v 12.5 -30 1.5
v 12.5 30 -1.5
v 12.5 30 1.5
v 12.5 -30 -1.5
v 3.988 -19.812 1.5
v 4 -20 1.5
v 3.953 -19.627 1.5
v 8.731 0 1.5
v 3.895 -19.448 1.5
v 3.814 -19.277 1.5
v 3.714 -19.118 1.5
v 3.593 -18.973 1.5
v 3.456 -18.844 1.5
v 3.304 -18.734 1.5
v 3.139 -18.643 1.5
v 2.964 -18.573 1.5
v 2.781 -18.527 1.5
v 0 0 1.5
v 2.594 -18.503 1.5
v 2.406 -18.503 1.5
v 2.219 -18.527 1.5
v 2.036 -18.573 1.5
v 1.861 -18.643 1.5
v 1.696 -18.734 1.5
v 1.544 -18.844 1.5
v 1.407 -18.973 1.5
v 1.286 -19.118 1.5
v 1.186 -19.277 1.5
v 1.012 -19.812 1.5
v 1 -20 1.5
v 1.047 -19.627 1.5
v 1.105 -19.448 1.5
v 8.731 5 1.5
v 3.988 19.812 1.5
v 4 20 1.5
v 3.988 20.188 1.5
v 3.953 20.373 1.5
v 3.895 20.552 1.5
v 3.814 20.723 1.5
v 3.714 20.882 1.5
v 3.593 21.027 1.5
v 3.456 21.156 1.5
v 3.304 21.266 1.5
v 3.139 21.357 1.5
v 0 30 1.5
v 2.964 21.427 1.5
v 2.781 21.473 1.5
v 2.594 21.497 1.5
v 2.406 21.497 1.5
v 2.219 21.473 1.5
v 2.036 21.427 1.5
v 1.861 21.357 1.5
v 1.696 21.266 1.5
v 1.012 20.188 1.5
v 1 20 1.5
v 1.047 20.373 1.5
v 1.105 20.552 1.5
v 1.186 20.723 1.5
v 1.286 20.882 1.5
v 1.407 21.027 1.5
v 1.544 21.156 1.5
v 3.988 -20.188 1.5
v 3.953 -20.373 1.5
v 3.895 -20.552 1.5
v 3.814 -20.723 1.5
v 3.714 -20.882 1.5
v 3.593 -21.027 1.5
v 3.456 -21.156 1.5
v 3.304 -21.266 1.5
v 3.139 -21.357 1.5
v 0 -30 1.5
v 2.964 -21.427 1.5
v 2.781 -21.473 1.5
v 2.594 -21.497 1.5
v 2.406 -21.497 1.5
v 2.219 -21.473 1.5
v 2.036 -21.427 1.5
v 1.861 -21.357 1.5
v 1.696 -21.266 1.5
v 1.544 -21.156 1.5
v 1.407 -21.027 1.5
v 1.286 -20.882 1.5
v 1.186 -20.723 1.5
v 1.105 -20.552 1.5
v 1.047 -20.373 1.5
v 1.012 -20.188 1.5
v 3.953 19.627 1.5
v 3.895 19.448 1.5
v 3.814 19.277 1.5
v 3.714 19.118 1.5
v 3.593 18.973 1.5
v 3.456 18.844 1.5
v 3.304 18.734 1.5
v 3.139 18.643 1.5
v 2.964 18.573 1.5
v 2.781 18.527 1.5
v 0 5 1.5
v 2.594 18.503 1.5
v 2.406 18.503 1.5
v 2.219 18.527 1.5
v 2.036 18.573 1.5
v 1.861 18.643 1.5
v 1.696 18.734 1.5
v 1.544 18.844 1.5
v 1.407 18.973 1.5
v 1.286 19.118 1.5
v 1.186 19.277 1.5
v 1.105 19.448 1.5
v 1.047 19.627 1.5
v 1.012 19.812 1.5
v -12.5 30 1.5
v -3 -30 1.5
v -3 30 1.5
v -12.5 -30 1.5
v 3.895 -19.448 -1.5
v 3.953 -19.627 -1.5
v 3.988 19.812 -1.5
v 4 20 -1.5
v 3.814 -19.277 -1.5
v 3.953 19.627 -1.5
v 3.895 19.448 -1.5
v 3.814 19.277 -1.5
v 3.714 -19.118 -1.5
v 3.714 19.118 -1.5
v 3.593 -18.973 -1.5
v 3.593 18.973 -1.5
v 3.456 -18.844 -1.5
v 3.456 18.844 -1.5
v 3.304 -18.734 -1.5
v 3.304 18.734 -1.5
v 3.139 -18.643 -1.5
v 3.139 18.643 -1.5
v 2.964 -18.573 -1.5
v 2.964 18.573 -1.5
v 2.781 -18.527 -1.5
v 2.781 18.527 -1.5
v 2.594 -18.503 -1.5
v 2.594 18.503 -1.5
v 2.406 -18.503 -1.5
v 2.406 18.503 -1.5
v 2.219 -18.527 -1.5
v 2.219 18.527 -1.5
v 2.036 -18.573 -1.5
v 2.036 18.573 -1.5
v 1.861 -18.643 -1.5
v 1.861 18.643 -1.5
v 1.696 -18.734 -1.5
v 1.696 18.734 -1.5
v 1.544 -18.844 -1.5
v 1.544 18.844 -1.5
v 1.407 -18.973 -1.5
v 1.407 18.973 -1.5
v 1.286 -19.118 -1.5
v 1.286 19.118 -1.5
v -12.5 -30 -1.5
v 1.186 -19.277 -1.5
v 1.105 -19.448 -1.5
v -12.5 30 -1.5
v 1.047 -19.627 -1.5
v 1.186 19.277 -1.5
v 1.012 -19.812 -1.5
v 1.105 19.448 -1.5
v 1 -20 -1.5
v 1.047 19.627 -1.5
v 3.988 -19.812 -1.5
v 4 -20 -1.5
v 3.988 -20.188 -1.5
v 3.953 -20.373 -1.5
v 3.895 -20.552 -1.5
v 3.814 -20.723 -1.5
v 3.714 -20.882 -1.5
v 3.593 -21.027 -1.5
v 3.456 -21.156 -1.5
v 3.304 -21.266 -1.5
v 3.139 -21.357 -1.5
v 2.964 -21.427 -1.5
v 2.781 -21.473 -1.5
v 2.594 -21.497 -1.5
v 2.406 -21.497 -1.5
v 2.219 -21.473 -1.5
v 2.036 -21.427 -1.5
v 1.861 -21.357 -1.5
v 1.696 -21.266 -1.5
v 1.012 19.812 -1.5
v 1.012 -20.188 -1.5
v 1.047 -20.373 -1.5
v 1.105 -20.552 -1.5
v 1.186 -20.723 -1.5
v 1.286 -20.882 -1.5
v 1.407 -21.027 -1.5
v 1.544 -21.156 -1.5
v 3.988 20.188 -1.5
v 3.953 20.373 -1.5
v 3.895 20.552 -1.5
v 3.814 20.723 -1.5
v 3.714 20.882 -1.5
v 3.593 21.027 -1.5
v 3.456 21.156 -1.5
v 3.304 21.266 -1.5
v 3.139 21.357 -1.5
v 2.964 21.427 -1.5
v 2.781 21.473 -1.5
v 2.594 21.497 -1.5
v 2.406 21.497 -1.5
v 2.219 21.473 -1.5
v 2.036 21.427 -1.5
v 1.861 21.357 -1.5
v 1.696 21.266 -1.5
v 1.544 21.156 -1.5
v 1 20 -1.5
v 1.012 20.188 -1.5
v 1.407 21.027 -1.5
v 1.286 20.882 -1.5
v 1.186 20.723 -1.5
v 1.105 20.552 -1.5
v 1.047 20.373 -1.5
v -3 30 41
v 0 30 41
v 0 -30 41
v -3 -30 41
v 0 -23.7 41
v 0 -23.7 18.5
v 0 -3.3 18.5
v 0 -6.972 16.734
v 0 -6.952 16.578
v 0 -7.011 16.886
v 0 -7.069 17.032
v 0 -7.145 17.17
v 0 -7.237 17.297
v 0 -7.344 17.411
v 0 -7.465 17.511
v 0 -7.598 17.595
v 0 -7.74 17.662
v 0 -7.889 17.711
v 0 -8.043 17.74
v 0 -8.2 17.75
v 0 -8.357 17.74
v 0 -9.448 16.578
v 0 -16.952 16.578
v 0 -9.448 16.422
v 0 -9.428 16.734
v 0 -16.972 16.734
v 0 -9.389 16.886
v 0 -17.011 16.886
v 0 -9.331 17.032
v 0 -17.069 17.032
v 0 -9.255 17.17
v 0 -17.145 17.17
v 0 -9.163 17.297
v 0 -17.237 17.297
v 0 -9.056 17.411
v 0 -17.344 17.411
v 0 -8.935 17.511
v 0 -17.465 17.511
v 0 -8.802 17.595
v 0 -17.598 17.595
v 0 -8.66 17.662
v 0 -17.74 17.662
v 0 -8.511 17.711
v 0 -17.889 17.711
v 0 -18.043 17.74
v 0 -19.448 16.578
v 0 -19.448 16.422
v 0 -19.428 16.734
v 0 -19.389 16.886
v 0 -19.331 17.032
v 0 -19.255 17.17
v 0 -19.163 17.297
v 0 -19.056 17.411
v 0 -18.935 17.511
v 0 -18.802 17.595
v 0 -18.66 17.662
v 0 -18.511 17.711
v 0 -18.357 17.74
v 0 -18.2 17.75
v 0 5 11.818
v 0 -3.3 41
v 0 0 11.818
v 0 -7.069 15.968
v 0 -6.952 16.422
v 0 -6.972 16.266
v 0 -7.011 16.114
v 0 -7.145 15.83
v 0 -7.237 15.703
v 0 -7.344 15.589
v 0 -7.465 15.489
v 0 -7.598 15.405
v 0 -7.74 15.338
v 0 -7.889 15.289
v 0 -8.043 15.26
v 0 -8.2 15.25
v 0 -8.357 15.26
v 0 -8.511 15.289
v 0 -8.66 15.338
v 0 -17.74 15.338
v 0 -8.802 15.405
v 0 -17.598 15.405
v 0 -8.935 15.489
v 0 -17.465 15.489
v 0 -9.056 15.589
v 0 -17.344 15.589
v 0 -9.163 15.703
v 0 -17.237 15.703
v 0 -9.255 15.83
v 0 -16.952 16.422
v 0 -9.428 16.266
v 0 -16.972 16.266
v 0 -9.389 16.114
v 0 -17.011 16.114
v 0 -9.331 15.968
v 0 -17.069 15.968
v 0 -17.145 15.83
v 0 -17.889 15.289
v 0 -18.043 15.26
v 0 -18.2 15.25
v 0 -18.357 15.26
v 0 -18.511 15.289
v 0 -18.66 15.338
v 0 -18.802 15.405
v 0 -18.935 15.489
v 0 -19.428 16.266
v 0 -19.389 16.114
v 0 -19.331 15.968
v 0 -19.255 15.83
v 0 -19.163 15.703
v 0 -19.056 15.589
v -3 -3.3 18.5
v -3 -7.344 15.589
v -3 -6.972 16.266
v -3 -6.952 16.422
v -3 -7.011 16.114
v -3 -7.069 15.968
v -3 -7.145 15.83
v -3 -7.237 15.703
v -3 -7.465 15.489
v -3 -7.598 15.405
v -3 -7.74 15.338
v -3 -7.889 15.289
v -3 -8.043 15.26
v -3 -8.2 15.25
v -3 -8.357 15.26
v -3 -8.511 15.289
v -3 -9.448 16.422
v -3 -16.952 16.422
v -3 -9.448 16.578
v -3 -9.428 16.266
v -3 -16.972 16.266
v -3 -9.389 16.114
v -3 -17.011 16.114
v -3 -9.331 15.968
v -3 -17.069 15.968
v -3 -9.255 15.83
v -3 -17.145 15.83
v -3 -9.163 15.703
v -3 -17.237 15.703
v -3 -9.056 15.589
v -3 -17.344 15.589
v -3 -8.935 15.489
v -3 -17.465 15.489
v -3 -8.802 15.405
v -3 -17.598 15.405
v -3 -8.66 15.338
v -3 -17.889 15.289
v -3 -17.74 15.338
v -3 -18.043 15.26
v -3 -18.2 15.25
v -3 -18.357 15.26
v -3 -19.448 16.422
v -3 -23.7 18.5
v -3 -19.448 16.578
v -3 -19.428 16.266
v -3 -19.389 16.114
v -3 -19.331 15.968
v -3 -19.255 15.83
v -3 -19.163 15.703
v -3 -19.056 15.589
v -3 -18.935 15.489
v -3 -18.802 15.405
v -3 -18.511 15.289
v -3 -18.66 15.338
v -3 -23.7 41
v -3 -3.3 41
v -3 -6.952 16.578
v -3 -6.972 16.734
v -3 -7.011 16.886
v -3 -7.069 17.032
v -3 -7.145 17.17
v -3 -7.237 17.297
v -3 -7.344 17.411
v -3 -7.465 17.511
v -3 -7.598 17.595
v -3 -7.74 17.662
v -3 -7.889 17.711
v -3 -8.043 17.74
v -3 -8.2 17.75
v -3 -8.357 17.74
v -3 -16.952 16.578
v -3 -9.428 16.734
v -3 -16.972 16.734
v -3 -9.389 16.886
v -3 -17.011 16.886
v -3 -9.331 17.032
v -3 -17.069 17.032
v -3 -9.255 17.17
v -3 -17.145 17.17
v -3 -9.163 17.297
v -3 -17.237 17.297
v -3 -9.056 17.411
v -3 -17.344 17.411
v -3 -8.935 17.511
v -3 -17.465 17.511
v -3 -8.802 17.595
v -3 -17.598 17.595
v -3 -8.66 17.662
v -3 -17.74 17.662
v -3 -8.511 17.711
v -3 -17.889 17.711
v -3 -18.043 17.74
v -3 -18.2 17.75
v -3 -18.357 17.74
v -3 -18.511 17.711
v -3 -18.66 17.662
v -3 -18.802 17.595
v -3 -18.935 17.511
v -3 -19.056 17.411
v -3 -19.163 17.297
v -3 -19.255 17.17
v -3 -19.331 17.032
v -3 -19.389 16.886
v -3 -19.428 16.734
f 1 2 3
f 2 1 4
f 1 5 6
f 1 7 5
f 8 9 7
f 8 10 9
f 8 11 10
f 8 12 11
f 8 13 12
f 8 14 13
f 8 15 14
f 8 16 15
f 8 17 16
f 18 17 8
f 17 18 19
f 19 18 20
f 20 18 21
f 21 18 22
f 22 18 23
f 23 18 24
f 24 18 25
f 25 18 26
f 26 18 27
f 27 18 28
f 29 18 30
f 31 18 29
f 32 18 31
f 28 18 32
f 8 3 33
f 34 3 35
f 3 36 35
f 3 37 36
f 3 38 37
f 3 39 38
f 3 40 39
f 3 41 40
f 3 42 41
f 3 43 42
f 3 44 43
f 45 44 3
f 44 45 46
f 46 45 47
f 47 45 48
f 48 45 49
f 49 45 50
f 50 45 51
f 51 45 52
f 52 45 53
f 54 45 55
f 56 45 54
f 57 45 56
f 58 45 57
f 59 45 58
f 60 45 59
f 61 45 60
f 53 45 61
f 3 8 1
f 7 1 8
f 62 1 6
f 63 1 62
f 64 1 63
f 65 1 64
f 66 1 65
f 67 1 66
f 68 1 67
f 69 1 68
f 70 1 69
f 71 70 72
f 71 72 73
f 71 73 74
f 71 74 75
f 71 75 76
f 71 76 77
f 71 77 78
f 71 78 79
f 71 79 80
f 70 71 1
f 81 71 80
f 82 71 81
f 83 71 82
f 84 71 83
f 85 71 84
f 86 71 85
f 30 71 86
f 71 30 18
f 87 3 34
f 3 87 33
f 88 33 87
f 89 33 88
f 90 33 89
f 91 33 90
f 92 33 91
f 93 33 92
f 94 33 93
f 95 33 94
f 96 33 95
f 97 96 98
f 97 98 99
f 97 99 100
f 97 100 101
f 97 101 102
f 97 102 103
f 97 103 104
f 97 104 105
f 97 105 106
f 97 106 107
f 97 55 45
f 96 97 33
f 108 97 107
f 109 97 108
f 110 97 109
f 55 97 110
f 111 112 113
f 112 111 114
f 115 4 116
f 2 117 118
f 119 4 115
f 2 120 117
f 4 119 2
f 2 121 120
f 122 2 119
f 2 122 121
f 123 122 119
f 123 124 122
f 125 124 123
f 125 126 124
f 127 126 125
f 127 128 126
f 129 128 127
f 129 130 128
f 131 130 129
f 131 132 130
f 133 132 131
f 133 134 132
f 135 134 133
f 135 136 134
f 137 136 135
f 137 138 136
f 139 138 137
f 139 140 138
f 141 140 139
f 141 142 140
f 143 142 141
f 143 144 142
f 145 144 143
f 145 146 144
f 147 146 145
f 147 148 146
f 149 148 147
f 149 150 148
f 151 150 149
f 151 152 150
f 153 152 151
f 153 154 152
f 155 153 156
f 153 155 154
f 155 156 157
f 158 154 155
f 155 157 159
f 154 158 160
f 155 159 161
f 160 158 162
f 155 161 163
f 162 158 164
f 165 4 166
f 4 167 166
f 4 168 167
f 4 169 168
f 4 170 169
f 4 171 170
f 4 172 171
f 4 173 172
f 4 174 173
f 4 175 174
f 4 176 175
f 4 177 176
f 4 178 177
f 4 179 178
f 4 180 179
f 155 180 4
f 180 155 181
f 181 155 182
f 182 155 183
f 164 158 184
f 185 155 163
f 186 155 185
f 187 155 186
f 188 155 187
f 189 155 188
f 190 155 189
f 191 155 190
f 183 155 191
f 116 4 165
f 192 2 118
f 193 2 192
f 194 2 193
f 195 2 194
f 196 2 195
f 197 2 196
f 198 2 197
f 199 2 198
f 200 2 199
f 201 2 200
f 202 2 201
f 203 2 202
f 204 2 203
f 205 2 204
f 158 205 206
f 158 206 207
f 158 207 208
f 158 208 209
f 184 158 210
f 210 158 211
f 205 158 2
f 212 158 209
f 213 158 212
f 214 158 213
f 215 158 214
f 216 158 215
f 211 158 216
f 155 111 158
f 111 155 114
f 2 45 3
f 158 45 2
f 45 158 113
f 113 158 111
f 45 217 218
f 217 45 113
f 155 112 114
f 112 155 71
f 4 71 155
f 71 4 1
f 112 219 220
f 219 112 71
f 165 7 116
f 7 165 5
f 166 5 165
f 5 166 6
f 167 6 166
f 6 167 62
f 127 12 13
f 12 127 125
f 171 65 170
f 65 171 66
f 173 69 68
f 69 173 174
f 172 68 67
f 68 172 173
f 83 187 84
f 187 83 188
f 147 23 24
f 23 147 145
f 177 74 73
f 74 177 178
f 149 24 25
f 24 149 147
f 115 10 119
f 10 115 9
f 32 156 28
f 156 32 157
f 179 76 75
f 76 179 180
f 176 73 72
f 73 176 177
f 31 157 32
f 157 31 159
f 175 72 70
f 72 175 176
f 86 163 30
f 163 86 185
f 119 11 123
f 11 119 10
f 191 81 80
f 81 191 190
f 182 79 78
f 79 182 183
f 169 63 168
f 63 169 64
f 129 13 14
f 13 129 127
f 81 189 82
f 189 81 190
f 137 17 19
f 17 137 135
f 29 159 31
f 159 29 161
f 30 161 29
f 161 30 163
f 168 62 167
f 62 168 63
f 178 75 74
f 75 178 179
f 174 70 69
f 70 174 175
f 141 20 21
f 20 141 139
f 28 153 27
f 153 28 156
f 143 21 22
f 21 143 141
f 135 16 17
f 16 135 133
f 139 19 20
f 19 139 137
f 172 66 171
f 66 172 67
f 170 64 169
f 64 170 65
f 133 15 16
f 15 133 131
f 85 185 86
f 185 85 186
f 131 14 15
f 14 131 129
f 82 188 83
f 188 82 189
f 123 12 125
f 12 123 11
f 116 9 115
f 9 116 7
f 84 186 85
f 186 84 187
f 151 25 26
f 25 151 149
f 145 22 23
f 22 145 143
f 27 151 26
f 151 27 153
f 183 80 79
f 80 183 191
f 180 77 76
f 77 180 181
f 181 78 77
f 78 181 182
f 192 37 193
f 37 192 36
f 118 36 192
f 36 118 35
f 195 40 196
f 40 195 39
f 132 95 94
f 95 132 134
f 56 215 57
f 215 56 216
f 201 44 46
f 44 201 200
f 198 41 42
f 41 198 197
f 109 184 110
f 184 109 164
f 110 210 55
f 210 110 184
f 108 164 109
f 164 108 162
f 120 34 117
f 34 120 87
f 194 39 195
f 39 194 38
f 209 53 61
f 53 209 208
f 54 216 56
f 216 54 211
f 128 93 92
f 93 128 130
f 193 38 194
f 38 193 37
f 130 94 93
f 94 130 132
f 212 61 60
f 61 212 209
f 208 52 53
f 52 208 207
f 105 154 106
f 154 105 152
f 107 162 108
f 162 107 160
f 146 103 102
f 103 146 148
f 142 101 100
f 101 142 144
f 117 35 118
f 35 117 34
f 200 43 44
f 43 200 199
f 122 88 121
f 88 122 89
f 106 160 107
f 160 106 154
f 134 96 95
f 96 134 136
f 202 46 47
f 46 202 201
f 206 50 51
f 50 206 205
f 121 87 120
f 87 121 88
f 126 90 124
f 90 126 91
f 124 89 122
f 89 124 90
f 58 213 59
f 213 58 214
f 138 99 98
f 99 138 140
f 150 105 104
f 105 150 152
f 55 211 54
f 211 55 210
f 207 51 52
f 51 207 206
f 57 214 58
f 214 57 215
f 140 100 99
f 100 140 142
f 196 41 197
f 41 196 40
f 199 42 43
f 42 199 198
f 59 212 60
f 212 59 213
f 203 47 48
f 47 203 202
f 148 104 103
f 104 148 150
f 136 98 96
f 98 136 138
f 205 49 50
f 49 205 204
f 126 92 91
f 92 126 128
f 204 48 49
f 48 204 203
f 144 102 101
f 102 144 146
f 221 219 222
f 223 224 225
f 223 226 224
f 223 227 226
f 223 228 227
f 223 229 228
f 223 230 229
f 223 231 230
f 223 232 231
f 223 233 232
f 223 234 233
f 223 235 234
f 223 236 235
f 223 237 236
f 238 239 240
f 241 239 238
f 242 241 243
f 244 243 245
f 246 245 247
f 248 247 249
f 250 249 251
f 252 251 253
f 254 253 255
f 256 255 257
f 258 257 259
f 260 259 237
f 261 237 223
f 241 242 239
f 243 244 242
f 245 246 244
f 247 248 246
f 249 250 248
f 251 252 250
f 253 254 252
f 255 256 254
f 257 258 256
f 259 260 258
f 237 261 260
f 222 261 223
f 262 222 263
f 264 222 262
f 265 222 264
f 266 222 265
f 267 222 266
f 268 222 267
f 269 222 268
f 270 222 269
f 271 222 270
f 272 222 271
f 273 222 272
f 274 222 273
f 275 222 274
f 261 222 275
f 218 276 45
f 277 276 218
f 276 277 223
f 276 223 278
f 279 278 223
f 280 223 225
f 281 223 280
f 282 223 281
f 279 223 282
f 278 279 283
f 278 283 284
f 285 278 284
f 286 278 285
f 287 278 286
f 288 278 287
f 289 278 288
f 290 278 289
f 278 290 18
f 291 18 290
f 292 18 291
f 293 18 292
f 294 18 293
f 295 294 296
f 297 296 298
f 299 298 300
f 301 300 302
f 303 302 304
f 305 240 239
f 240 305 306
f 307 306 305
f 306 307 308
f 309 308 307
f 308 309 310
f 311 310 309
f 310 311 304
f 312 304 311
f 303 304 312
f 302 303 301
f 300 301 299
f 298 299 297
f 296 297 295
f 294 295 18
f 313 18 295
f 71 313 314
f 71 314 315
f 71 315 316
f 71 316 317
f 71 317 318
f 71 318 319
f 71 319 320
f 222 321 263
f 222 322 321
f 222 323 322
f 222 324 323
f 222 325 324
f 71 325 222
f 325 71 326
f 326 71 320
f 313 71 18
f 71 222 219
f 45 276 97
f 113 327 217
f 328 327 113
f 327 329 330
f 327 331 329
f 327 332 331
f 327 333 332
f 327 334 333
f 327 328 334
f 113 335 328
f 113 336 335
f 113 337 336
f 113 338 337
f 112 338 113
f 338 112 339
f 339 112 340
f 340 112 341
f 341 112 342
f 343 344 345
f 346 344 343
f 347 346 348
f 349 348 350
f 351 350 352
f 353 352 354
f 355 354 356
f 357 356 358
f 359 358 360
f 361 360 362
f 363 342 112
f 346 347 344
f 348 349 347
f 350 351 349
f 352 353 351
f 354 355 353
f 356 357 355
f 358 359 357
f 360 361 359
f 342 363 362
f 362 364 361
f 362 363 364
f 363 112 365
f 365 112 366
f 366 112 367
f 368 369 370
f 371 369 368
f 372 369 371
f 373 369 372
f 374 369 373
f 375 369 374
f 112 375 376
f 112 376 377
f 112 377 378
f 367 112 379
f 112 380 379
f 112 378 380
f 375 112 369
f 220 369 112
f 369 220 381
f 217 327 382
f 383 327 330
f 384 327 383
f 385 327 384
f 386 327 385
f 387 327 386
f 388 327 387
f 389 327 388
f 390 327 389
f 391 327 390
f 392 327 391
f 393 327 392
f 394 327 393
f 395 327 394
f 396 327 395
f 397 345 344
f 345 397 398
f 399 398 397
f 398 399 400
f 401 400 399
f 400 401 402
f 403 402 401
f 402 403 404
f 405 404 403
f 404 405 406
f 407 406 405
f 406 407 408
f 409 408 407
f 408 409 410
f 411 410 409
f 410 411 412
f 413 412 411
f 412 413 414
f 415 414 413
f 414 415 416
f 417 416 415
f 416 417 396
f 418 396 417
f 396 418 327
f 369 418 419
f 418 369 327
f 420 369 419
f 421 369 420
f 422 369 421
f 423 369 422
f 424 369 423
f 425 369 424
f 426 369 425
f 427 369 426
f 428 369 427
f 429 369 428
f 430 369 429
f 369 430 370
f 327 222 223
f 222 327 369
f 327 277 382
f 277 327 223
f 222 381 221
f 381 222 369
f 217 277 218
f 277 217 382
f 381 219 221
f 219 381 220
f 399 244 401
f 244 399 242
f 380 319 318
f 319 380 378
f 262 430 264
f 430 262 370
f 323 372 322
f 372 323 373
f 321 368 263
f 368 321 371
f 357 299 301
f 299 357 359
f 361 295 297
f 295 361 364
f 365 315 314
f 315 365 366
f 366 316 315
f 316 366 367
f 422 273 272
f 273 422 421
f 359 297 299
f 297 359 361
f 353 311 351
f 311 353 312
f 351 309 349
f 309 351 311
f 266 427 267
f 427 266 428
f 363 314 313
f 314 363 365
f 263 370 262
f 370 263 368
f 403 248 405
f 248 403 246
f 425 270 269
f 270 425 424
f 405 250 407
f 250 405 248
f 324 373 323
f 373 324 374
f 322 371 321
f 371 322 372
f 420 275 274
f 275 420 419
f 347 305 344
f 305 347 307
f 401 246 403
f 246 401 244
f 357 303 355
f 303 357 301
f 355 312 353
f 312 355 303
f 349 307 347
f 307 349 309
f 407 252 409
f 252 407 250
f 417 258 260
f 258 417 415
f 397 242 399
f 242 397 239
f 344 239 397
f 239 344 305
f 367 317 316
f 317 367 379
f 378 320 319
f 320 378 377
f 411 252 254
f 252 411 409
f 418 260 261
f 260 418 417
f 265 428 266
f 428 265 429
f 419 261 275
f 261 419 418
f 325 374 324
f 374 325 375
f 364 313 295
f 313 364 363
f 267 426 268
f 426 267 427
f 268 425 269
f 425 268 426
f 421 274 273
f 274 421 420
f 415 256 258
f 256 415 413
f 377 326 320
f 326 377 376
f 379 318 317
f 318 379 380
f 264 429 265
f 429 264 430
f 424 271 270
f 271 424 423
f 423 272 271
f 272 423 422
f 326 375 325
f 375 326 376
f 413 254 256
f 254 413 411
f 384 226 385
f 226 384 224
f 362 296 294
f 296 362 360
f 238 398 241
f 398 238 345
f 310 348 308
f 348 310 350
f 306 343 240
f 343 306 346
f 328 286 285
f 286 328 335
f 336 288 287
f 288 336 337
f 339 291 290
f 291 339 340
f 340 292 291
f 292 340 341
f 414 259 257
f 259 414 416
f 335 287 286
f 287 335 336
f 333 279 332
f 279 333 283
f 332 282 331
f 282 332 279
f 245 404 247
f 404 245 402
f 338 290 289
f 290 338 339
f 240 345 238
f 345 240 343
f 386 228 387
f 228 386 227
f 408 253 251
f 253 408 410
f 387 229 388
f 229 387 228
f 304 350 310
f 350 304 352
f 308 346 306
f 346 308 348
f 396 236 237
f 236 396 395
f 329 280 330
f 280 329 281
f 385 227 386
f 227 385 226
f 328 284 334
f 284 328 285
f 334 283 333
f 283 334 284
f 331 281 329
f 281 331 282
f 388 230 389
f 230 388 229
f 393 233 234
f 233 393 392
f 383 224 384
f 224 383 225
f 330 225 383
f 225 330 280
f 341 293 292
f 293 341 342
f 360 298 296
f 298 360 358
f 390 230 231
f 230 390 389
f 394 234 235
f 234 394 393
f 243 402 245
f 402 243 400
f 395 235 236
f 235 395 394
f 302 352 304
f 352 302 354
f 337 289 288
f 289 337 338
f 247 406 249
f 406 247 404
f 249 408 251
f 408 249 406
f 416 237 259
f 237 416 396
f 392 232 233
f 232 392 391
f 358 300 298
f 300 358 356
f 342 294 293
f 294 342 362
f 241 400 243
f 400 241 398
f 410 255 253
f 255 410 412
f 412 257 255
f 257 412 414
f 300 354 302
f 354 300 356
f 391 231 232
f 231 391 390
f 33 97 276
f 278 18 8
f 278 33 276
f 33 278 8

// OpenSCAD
//Author: Piotr Paterek, Kraków 05-08.2016
$fn=50;
module bevel()
{
    module base()
    {
        difference()
        {
           difference()
            {
                cube([25,60,3], center=true);
                translate([2.5,-20,-1.5])
                {
                    cylinder(r=1.5, h=3);
                }
            }
            translate([2.5,20,-1.5])
            {
                cylinder(r=1.5, h=3);
            }
        }
    }
    base();
    translate([-1.5,0,26.5])
    {
        cube([3,60,50], center=true);
    }
}

//servo holes
difference()
    {
    difference()
    { 
        difference()
        {
            difference()
            {
                bevel();
                translate([-0,-13.5,30])
                {
                    cube([10,20.4,23],center=true);
                }
            }
            
            rotate(a=90, v=[0,1,0])
            {
                translate([-53.5,0,-2-0])
                {
                    cube([25,60,15], center=true);
                }
            }
        }
        rotate(a=90, v=[0,1,0])
        {
            translate([-16.5,-18.2,0])
            {
                cylinder(r=1.25, h=10, center=true);
            }
        }
        rotate(a=90, v=[0,1,0])
        {
            translate([-16.5,-8.2,0])
            {
                cylinder(r=1.25, h=10, center=true);
            }
        }
    }
    
}
   translate([2,5,-2])
                    {
        
                    rotate(a=90,v=[1,0,0])
                        {
        linear_extrude(height=5, convexity = 10){
        polygon(points=[[-3,15],[8,2],[-3,2]]);
        }
    }
}
   
